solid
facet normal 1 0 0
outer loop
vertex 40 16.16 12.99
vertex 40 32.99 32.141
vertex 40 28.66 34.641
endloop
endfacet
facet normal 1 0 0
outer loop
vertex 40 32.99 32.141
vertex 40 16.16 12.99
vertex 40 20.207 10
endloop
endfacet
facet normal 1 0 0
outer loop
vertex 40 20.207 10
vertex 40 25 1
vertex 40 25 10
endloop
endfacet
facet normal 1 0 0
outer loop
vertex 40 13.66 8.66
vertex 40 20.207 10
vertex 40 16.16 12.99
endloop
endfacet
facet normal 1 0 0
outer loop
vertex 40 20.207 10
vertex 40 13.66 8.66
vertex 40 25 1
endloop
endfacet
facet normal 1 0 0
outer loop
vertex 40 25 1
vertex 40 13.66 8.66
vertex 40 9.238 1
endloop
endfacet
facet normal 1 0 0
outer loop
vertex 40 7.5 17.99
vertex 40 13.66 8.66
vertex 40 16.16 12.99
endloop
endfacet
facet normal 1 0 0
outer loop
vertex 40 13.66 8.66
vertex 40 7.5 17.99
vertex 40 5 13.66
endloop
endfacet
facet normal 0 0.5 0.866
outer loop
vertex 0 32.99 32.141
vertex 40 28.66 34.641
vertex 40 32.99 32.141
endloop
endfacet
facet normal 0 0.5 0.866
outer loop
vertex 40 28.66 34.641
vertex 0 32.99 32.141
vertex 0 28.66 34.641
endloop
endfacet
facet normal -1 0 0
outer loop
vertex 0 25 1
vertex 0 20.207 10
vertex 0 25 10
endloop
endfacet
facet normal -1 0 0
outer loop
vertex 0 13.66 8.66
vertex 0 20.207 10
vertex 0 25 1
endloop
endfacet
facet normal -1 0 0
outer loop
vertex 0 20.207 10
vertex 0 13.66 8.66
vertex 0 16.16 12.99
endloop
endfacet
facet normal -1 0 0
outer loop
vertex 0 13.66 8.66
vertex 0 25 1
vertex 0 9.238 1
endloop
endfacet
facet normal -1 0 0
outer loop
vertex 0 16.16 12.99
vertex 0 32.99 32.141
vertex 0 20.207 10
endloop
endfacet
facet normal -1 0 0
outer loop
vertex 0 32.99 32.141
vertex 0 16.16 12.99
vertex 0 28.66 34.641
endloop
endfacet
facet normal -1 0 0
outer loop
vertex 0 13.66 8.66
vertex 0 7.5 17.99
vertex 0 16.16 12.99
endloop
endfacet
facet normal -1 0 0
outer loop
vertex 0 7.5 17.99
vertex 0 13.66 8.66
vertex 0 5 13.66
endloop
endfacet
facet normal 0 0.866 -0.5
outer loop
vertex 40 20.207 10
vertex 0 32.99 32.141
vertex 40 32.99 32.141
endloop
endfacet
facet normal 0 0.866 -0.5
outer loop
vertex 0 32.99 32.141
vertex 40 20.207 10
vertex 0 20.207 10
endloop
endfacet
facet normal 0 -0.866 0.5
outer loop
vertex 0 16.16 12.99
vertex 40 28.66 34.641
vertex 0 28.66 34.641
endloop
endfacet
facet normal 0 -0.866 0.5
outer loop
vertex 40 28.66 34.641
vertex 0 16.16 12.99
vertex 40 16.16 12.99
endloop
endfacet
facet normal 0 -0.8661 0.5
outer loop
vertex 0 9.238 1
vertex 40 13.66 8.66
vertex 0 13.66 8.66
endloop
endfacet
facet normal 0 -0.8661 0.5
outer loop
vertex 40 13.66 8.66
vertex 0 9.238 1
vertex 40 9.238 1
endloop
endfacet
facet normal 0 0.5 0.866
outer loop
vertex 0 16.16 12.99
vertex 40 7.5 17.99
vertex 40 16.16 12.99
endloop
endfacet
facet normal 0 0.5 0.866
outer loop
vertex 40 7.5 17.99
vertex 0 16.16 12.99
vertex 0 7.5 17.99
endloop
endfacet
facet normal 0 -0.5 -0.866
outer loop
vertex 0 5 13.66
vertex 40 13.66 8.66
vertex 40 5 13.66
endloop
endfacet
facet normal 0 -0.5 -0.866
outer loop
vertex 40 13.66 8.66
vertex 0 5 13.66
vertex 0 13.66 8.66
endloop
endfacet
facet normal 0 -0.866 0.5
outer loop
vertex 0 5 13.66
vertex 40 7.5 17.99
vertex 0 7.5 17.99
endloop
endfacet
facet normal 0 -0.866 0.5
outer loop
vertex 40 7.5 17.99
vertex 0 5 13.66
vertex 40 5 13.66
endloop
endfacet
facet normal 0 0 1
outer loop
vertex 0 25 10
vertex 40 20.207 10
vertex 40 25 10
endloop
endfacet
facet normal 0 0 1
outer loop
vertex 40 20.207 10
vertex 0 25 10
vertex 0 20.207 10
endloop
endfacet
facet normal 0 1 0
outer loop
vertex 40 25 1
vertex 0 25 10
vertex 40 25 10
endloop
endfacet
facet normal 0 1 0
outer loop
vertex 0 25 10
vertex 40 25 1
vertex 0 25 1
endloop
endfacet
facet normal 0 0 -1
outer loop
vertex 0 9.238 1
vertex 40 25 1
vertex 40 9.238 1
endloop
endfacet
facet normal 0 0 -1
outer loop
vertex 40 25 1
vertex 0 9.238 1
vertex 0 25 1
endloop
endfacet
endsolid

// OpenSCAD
// Small stand to rest a tablet on for charging/etc

// I never actually tried full-size as the test one worked as a kick-stand
//width = 70;
//height = 70;

// Cut-down version for testing
width = 40;
height = 40;

difference(){
    union(){
        translate([0, 0, 5])
            rotate([-30, 0, 0])
            union() {
                translate([0, 10, 0])
                    cube([width, 5, height]);
                translate([0, 0, 10])
                    cube([width, 10, 5]);
            };
        translate([0, 15, 0])
            cube([width, 10, 10]);
    }
    translate([0, 0, -4])
        cube([width, width, 5]);
}
